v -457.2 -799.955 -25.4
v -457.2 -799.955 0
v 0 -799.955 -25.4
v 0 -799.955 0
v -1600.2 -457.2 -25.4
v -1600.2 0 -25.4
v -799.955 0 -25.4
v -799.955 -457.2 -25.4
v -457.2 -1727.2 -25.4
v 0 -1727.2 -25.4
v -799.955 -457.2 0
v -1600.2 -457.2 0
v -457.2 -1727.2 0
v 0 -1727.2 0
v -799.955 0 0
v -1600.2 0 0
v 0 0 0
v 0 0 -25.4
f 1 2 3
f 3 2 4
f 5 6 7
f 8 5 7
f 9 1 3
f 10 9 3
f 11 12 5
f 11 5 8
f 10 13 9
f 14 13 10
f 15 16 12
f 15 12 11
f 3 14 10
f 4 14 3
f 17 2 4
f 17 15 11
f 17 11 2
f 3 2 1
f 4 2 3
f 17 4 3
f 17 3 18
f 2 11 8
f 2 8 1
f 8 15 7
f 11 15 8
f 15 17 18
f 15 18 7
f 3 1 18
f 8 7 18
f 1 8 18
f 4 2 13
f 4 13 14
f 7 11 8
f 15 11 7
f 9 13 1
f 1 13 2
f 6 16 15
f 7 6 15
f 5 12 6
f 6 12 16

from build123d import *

# Parameters (mm, degrees)
F2_W     = 800.2447458586
F2_H     = 457.2
F4_DEPTH = 25.4
F5_DEPTH = 25.4
F3_W     = 457.2
F3_H     = 927.2447458586
F6_DEPTH = 25.4


with BuildPart() as f4:
    # F2 (on face) → F4 (new body)
    with BuildSketch(Plane.XY):
        with Locations((-1200.0776270707, -228.6)):
            Rectangle(F2_W, F2_H)
    extrude(amount=-F4_DEPTH)


with BuildPart() as f5:
    # F3 (on face) → F5 (new body)
    with BuildSketch(Plane.XY):
        Polygon((-457.2, -799.9552541414), (0, -799.9552541414), (0, 0), (-799.9552541414, 0), (-799.9552541414, -457.2), align=None)
    extrude(amount=-F5_DEPTH)


with BuildPart() as f6:
    # F3 (on face) → F6 (new body)
    with BuildSketch(Plane.XY):
        with Locations((-228.6, -1263.5776270707)):
            Rectangle(F3_W, F3_H)
    extrude(amount=-F6_DEPTH)


solid = Compound([f4.part, f5.part, f6.part])
